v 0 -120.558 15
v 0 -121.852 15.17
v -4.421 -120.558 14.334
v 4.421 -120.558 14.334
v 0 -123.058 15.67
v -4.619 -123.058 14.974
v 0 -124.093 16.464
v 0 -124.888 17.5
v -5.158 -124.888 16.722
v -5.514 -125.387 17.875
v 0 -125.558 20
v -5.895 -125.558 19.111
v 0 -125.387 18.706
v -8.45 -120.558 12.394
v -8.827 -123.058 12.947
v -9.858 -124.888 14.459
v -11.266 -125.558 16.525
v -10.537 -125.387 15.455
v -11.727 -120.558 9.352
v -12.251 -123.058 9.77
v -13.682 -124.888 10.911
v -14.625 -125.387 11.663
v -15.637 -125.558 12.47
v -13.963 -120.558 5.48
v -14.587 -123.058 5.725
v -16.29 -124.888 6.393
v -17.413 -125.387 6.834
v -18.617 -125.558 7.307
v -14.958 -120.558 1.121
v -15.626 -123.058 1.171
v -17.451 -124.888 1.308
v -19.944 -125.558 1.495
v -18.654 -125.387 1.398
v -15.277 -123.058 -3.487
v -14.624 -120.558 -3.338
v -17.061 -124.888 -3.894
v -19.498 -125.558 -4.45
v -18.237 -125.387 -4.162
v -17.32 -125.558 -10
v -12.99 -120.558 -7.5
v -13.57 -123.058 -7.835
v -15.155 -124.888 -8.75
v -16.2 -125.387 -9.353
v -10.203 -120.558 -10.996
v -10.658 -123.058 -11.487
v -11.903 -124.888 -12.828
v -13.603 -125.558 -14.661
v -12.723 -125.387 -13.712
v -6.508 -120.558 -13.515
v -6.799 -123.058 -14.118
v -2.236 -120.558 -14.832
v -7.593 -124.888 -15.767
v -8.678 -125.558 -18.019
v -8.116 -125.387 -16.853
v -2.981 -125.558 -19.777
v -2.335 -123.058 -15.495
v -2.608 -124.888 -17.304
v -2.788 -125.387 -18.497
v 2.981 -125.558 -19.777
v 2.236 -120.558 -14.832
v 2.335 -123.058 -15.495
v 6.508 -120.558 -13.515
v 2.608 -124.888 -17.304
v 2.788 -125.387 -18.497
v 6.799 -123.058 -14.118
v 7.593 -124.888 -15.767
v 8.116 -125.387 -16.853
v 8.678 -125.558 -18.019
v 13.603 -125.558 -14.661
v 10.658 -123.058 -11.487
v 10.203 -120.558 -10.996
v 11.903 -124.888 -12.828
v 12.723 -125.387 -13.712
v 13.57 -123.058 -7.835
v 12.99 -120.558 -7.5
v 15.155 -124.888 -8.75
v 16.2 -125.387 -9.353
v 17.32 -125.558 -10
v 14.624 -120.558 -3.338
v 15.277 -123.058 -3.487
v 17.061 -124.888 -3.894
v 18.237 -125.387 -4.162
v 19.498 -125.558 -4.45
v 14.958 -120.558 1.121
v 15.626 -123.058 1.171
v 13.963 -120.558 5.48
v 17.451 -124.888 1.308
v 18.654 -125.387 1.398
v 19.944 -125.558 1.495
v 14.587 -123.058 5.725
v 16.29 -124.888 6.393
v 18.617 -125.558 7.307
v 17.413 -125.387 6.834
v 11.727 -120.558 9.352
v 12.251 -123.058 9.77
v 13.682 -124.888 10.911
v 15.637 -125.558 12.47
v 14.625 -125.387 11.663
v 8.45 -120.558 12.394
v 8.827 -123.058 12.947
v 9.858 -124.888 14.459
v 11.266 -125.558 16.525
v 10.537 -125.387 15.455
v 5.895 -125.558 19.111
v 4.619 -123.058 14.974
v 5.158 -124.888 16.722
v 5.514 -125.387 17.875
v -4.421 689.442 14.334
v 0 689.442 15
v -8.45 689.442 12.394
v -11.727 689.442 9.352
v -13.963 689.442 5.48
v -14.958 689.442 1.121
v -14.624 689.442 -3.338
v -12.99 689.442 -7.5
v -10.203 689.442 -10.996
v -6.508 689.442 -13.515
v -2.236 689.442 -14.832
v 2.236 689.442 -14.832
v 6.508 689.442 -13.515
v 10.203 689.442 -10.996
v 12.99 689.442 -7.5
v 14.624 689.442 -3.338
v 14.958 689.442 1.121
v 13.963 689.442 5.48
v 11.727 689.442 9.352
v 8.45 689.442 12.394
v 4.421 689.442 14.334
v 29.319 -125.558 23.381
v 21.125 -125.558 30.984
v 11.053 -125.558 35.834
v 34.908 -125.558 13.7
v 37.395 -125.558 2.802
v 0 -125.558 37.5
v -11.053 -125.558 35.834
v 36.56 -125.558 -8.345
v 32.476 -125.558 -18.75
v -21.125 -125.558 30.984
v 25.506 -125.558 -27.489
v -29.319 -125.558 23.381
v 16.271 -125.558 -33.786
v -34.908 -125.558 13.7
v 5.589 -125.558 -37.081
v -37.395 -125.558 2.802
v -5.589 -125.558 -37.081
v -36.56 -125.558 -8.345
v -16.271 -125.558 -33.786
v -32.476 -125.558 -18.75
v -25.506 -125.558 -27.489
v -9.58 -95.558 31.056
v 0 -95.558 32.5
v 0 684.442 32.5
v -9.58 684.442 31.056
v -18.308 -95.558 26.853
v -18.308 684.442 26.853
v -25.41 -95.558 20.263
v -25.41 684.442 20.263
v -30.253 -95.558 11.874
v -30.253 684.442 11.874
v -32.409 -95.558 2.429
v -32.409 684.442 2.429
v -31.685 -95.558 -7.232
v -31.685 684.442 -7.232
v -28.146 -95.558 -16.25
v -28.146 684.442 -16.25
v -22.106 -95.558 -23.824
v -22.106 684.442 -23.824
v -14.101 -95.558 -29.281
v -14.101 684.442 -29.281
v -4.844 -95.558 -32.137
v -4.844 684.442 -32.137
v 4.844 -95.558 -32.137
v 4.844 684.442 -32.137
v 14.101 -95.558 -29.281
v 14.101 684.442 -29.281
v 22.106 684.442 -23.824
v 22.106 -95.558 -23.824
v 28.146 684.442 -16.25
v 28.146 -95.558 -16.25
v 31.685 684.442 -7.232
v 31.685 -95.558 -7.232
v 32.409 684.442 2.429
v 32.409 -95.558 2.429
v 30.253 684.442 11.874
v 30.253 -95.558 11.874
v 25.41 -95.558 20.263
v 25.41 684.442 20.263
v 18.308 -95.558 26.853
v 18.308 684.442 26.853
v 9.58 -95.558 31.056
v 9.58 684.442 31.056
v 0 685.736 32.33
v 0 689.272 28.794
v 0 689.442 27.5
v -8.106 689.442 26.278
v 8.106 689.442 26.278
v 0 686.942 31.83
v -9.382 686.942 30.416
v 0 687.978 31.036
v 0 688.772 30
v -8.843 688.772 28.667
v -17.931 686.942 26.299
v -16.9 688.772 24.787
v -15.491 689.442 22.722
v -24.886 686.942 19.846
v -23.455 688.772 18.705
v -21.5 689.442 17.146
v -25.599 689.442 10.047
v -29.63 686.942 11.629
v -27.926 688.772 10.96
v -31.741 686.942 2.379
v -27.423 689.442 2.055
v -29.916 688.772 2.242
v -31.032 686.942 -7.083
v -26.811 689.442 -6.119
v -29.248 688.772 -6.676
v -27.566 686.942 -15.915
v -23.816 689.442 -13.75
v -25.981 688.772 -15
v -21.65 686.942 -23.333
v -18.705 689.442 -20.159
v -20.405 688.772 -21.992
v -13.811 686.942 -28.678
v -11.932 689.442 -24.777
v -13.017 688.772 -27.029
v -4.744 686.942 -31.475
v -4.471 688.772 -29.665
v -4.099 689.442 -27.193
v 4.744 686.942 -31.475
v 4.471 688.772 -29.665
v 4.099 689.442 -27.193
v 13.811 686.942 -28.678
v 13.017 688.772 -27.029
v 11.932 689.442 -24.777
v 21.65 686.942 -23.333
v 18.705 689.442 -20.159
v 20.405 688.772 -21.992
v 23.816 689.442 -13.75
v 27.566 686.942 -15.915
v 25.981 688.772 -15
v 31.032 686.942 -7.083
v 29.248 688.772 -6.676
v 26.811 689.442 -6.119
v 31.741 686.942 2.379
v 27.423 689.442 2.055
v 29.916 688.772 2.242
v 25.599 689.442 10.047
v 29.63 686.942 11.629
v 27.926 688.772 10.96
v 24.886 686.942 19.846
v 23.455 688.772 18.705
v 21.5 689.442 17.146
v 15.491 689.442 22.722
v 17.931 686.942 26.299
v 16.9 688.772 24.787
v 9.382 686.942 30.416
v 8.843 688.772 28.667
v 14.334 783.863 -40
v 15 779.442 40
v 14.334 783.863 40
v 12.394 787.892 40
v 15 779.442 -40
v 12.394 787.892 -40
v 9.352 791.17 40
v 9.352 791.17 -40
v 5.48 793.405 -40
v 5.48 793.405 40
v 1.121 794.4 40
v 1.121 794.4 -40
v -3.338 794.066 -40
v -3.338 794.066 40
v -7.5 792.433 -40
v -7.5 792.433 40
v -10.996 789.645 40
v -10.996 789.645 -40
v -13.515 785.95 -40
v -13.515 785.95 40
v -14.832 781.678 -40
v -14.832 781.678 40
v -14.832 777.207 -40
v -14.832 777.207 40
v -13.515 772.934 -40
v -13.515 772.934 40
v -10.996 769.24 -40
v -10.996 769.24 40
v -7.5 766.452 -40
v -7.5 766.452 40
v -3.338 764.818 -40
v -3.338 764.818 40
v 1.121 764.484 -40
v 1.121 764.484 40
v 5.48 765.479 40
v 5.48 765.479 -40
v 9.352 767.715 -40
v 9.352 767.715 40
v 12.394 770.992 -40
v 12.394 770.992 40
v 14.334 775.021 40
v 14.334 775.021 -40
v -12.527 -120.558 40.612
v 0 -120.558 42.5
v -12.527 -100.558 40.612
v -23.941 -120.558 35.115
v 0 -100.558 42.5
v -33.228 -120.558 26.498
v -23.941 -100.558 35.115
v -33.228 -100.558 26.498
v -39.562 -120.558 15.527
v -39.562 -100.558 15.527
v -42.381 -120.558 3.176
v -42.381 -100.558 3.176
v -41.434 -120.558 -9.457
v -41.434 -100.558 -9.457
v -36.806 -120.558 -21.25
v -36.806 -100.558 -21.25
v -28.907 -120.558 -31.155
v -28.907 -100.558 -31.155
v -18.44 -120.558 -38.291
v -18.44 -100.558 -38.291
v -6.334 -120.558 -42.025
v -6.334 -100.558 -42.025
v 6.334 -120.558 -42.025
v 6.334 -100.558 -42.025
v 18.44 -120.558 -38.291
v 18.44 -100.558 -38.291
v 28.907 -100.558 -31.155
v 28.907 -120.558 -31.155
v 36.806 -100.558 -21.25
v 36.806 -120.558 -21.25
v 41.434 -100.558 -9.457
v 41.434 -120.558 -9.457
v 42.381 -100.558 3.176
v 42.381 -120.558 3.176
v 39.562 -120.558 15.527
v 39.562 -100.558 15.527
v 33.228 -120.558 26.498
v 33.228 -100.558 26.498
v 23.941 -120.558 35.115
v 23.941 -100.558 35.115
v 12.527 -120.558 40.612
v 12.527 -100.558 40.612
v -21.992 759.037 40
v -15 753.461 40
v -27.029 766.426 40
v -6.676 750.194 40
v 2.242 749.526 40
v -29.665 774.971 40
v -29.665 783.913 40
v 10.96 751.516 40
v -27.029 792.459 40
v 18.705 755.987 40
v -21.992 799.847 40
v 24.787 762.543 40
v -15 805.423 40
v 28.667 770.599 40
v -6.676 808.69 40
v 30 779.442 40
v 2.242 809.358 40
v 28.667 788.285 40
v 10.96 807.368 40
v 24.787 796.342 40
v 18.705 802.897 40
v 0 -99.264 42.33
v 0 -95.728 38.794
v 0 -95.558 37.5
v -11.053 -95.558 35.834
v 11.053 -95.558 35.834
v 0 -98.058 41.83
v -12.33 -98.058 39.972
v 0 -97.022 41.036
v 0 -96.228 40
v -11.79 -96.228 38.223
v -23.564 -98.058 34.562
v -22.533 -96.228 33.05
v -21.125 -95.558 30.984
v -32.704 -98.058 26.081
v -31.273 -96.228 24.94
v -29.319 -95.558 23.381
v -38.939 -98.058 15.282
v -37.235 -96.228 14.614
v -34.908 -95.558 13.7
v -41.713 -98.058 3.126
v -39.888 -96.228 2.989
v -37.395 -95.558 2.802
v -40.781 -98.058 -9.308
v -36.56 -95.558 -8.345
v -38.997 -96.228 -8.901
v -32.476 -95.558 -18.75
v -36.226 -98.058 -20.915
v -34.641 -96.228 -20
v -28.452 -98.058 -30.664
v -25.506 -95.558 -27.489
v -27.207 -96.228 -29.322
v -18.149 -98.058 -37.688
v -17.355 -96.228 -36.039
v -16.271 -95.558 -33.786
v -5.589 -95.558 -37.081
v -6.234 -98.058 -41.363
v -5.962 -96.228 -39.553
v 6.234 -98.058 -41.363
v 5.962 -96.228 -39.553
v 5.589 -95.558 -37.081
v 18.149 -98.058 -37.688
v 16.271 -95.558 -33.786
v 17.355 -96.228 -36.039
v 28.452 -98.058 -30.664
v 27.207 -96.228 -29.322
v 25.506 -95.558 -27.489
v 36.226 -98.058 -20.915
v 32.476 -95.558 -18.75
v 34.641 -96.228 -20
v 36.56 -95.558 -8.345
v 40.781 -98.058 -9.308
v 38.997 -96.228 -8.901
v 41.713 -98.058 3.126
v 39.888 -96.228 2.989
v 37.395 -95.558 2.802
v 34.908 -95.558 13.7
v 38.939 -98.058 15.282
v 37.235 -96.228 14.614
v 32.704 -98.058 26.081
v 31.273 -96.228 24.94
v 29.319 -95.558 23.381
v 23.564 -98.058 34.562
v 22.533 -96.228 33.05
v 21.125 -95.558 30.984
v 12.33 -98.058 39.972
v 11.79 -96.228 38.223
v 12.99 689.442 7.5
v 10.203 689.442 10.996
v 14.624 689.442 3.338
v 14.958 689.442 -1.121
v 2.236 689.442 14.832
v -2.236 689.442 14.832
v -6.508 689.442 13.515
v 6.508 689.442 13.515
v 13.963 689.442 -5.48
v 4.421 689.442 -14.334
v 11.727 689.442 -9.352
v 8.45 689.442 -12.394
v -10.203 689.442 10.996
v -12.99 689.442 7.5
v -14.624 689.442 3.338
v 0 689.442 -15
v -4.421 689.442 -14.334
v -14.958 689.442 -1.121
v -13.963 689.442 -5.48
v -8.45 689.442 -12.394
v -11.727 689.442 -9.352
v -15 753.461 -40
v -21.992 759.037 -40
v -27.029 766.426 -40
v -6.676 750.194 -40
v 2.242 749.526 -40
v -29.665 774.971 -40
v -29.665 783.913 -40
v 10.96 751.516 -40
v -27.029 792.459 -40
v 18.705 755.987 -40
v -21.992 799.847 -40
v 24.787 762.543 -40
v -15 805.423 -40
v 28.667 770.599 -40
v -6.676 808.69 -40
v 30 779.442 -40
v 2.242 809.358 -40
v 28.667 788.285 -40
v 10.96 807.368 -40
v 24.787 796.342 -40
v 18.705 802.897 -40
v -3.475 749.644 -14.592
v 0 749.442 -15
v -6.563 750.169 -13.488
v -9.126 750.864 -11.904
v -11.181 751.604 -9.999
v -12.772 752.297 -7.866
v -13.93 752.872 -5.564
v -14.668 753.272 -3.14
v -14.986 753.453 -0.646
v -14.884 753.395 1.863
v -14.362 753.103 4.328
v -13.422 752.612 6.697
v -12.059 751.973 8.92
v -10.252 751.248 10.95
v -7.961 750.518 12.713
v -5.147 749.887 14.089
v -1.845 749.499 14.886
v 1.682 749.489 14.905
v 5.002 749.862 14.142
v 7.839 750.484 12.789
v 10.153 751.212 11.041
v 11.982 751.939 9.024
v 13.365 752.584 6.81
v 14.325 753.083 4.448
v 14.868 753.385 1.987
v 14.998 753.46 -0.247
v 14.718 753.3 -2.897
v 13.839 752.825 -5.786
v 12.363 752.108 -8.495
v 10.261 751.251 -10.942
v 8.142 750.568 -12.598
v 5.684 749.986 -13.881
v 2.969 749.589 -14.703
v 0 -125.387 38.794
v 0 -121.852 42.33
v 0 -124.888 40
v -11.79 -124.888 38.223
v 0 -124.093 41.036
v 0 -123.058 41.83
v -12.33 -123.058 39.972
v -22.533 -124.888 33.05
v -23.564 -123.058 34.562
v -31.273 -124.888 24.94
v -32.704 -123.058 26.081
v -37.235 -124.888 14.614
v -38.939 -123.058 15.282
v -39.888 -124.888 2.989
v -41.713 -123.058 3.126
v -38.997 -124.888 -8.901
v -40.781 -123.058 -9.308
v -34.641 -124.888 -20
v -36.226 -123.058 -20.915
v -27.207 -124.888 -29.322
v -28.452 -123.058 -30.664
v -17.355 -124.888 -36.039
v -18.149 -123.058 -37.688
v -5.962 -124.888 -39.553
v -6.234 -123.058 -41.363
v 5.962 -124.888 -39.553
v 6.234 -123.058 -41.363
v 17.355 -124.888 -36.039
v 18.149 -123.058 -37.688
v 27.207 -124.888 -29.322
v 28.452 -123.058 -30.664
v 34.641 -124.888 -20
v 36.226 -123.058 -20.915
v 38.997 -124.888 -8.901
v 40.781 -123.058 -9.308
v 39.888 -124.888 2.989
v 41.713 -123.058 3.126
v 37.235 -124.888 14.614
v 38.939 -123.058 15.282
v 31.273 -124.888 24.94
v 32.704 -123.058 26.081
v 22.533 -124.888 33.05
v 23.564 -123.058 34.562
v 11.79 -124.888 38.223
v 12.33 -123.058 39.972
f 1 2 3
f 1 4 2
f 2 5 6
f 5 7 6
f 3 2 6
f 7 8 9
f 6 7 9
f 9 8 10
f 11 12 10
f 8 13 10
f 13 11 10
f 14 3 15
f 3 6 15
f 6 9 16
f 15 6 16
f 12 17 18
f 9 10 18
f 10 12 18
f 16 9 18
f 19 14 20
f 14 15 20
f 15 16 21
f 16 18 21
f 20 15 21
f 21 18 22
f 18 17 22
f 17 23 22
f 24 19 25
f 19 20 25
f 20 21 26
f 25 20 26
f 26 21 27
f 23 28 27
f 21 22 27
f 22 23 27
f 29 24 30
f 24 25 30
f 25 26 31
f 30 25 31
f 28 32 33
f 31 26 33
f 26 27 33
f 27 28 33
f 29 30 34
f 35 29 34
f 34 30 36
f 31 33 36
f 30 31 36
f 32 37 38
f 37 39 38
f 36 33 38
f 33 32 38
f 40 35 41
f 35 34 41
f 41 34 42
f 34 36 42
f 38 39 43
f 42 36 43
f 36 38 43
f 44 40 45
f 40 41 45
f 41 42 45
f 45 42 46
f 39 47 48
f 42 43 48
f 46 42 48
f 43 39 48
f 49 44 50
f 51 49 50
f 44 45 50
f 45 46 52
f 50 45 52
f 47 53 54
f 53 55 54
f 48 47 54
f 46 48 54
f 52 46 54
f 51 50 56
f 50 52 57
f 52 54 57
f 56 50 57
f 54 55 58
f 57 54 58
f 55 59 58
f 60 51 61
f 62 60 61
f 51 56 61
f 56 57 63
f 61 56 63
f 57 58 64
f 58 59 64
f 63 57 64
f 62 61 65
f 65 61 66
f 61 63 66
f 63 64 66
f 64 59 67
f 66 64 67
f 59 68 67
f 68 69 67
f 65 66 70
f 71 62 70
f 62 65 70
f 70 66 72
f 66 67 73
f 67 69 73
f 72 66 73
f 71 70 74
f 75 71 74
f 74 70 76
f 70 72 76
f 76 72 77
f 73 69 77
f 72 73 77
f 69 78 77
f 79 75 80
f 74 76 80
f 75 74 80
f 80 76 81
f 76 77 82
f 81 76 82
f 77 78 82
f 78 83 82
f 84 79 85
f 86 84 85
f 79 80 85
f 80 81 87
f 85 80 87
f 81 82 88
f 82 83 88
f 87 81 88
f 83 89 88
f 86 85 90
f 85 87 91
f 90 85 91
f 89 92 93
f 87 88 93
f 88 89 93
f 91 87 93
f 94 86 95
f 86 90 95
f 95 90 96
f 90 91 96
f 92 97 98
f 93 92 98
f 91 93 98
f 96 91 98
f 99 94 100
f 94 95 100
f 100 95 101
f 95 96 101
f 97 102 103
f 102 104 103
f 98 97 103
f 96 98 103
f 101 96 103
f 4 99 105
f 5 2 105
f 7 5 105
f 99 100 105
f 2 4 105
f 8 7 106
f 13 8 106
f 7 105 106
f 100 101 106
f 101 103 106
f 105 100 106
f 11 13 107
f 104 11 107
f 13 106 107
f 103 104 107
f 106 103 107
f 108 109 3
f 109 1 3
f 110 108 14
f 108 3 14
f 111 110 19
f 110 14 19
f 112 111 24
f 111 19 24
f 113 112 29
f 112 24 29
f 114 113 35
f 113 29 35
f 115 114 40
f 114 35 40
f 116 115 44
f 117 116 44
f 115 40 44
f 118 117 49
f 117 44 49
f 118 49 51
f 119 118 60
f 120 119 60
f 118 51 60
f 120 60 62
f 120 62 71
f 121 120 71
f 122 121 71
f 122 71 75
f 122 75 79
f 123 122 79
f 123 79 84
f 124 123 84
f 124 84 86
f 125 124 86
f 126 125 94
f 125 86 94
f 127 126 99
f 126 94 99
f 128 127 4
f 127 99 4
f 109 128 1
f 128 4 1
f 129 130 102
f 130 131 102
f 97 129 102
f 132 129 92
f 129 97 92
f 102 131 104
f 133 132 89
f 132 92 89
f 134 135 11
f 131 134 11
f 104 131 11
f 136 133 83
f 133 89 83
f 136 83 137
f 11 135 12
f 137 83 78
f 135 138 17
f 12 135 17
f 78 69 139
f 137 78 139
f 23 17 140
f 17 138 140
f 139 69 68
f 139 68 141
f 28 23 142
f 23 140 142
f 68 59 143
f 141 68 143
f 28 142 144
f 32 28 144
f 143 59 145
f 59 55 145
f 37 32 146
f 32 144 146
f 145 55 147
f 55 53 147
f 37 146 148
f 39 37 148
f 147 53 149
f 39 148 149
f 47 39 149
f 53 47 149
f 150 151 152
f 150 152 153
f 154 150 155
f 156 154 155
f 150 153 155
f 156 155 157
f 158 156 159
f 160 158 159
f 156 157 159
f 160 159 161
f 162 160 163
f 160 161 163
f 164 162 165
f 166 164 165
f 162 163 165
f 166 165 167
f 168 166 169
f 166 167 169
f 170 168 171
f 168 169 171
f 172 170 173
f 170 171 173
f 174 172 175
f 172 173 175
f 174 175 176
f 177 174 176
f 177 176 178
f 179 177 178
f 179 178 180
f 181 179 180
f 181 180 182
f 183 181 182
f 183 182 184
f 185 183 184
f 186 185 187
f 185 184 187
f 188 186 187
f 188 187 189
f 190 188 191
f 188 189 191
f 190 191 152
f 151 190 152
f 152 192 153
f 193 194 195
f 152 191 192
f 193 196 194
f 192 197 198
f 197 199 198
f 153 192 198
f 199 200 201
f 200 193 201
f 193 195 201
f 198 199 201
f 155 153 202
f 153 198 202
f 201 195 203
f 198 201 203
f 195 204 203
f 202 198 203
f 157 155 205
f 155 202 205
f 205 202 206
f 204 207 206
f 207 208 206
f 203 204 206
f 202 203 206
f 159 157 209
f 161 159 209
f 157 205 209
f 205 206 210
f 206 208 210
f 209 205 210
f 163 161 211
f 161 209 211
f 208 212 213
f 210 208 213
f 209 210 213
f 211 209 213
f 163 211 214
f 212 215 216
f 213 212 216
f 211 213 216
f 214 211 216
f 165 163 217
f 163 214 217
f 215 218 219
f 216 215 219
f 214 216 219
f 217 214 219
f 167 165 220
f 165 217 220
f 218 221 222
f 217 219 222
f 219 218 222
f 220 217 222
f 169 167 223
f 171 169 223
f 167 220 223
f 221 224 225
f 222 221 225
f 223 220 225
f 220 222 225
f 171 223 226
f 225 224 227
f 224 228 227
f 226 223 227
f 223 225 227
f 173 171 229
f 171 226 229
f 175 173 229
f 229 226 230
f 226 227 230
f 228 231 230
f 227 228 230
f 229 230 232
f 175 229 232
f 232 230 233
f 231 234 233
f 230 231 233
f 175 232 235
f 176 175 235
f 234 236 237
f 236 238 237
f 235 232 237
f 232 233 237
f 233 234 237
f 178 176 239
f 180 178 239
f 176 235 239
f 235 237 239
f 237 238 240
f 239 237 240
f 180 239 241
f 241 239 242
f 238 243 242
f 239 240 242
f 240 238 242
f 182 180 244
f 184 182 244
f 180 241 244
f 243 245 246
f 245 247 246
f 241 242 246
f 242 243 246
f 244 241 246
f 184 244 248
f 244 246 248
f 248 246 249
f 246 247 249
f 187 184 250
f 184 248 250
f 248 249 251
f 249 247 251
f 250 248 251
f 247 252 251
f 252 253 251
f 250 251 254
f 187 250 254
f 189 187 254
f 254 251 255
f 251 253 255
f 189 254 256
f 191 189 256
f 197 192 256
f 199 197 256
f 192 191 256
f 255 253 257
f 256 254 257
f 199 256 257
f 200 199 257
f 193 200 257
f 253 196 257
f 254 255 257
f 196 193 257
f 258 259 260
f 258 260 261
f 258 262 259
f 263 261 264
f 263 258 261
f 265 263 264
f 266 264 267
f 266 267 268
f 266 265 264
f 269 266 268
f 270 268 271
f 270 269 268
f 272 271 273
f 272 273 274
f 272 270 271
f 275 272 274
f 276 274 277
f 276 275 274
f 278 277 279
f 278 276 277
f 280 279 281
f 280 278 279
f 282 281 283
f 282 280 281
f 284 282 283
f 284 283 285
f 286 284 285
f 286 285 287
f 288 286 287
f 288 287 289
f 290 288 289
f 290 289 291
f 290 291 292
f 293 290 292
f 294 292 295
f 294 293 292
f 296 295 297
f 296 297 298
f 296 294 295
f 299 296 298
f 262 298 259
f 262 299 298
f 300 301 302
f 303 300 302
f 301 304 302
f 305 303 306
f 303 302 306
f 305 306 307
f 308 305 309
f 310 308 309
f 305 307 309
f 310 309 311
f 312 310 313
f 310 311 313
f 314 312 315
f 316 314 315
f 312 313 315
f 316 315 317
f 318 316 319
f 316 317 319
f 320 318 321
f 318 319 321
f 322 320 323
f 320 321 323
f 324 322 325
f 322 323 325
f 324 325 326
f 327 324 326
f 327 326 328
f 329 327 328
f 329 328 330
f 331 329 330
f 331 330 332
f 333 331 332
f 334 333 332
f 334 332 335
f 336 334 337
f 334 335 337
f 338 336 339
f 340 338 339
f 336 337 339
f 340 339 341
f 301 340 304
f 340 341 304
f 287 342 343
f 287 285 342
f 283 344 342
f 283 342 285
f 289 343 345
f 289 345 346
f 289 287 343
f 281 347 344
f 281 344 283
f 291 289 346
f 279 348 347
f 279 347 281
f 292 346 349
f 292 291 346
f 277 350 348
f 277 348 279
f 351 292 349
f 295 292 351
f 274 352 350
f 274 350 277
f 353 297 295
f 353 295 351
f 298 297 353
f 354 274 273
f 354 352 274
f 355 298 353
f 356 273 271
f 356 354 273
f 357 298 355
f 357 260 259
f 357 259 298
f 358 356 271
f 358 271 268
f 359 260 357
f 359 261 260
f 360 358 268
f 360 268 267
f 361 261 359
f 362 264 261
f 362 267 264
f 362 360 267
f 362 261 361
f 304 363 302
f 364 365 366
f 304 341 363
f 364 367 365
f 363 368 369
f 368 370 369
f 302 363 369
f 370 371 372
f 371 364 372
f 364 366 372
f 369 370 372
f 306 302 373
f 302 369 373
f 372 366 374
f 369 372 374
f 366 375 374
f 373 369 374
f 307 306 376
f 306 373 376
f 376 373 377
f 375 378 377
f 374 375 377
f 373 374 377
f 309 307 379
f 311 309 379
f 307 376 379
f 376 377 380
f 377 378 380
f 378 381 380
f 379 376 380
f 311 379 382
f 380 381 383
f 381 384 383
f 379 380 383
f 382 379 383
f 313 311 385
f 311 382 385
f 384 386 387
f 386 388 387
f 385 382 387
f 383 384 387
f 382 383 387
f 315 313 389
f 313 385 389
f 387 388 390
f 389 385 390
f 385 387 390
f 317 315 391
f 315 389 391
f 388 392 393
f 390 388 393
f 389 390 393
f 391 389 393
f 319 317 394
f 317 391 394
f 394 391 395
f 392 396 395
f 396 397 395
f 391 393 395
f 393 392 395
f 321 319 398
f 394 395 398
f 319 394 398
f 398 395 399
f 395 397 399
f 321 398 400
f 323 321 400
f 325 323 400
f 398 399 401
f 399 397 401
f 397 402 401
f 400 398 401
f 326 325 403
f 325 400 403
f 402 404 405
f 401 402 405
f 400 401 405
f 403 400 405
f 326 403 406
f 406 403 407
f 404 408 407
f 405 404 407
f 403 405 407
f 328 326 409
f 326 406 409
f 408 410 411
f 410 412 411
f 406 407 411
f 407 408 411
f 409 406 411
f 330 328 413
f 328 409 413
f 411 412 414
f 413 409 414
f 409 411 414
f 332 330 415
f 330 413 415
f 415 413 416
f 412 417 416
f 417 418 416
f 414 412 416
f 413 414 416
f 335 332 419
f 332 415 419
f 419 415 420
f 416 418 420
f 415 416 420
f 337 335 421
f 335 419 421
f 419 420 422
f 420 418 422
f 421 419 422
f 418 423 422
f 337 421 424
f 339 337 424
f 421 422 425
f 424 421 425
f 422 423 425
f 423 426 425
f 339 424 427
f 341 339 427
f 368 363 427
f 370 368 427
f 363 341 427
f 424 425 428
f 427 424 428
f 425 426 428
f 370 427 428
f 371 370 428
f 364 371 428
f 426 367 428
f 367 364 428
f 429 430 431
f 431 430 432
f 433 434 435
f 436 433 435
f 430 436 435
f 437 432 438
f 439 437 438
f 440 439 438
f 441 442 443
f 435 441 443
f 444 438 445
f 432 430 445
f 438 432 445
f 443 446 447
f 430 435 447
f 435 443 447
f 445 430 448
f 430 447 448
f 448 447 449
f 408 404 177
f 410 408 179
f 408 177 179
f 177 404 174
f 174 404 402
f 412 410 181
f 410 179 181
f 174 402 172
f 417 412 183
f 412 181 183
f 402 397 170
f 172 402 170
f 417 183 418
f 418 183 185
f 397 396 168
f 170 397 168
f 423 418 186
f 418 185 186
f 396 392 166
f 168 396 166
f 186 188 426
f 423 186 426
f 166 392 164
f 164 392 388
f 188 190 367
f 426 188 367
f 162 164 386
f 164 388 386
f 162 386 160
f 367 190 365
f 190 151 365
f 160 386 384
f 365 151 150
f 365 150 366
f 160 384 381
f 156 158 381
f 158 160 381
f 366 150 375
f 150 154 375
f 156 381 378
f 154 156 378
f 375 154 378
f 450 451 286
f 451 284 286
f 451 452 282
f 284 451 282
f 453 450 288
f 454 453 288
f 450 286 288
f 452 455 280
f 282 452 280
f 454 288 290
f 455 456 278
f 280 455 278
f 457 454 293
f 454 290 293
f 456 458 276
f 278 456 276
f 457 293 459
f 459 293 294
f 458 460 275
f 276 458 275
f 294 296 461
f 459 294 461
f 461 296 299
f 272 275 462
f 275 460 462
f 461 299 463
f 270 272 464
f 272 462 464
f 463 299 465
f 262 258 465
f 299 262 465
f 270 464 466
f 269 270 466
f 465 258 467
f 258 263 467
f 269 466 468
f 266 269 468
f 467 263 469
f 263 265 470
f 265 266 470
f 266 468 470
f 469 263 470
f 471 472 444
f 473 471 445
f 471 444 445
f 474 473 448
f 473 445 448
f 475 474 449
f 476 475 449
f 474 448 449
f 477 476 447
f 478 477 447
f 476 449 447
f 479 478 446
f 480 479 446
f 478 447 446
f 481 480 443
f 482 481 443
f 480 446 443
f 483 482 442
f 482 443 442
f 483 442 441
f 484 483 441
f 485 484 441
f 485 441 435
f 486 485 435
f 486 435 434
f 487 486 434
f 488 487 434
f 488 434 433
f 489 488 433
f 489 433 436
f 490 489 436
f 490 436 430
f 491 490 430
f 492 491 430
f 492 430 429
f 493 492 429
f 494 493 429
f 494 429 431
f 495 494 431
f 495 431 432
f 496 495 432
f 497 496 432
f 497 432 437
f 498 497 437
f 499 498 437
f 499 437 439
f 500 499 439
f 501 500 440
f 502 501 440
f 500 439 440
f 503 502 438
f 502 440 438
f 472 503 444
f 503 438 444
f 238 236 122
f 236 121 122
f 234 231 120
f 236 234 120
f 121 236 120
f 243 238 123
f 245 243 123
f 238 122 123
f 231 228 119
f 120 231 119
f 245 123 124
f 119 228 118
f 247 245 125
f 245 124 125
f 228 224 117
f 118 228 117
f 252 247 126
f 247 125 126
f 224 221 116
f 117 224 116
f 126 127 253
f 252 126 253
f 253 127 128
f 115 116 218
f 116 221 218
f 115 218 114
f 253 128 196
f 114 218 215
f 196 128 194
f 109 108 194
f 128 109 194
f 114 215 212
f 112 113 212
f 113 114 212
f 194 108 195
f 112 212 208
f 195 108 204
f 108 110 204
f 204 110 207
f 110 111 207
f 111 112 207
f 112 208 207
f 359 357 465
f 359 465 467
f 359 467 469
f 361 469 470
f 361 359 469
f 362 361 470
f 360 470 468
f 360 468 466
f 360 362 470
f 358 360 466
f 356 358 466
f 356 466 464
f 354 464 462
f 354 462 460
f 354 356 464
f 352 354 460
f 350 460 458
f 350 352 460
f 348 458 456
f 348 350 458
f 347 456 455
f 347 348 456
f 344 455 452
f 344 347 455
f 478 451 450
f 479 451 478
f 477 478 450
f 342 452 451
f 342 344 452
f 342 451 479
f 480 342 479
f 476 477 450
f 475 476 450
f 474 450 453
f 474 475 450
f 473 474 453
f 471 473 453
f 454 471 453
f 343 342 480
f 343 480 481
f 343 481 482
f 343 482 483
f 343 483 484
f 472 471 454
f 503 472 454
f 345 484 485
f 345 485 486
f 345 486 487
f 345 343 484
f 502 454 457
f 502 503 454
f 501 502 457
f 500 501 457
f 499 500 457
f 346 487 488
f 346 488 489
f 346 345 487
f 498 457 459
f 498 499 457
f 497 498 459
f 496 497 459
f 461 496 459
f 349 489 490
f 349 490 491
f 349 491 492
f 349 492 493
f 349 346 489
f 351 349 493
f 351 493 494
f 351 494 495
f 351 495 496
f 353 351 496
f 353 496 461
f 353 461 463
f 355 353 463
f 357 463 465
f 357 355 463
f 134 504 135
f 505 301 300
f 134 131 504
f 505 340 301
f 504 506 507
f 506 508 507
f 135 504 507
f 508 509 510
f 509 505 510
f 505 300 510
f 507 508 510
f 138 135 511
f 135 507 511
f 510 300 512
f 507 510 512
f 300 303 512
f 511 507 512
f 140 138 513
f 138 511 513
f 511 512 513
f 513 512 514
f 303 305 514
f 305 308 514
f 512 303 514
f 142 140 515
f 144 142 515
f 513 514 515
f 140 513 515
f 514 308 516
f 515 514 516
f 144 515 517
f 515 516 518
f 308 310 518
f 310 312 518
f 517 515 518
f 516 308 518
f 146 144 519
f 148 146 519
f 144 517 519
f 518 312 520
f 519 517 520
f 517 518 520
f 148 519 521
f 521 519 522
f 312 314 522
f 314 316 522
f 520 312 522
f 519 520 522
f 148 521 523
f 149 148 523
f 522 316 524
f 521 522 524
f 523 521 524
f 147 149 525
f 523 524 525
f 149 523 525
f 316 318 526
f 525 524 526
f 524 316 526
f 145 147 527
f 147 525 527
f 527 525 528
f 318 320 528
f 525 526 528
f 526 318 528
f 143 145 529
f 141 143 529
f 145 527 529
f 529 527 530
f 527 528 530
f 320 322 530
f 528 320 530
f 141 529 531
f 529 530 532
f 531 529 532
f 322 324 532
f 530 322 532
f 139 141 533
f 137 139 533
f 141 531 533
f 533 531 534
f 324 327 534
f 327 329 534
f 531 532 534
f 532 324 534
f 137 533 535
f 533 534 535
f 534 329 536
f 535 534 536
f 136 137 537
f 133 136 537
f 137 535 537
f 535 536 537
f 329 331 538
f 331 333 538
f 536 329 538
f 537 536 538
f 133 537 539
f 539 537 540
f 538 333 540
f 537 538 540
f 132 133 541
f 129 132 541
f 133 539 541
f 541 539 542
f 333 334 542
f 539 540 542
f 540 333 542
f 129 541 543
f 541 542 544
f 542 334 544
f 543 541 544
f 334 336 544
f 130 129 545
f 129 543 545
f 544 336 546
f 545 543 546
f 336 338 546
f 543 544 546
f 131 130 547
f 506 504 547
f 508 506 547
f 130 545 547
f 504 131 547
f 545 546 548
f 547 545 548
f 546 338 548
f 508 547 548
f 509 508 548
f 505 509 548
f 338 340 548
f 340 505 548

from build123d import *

# Parameters (mm, degrees)
SKETCH3_R                = 30
SKETCH3_R_2              = 15
BOSS_EXTRUDE2_DEPTH      = 40
BOSS_EXTRUDE3_REACH      = 819.213
BOSS_EXTRUDE3_END_RADIUS = 30
SKETCH4_R                = 15


with BuildPart() as part:
    # Sketch1 → Revolve1 (revolve)
    with BuildSketch(Plane.XY, mode=Mode.PRIVATE) as revolve1_sk:
        with BuildLine():
            Line((-19.9999, -125.557753903), (-37.5, -125.557753903))
            ThreePointArc((-37.5, -125.557753903), (-41.035533906, -124.093287809), (-42.5, -120.557753903))
            Line((-42.5, -120.557753903), (-42.5, -100.557753903))
            ThreePointArc((-42.5, -100.557753903), (-41.035533906, -97.022219997), (-37.5, -95.557753903))
            Line((-37.5, -95.557753903), (-32.5, -95.557753903))
            Line((-32.5, -95.557753903), (-32.5, 684.442246097))
            ThreePointArc((-32.5, 684.442246097), (-31.035563195, 687.977709292), (-27.5001, 689.442146097))
            Line((-27.5001, 689.442146097), (-15, 689.442146097))
            Line((-15, 689.442146097), (-15, -120.557853903))
            ThreePointArc((-15, -120.557853903), (-16.464436805, -124.093317098), (-19.9999, -125.557753903))
        make_face()
    revolve(revolve1_sk.sketch.rotate(Axis((0, 143.904834125, 0), (0, -1, 0)), 270), axis=Axis((0, 143.904834125, 0), (0, -1, 0)))


with BuildPart() as body_2:
    # Sketch3 → Boss-Extrude2 (new, symmetric)
    with BuildSketch(Plane.XY):
        with Locations((0, 779.442146097)):
            Circle(SKETCH3_R)
        with Locations((0, 779.442146097)):
            Circle(SKETCH3_R_2, mode=Mode.SUBTRACT)
    extrude(amount=BOSS_EXTRUDE2_DEPTH, both=True)

    # Boss-Extrude3: up to this cylinder (the profile starts outside it)
    boss_extrude3_end = Plane(origin=(0, 779.442146097, 0), z_dir=(0, 0, -1)) * Cylinder(BOSS_EXTRUDE3_END_RADIUS, 1699.426, mode=Mode.PRIVATE)
    # Sketch4 → Boss-Extrude3 (add, up to the surface)
    with BuildSketch(Plane(origin=(0, 689.442146097, 0), x_dir=(1, 0, 0), z_dir=(0, 1, 0)), mode=Mode.PRIVATE) as boss_extrude3_sk1:
        with Locations(Location((0, 0, 0), (0, 0, 90))):
            Circle(SKETCH4_R)
    boss_extrude3_tool1 = extrude(boss_extrude3_sk1.sketch, amount=BOSS_EXTRUDE3_REACH, mode=Mode.PRIVATE) - boss_extrude3_end
    add(boss_extrude3_tool1.solids().sort_by_distance((0, 689.442146, 0))[0])


solid = Compound([part.part, body_2.part])
